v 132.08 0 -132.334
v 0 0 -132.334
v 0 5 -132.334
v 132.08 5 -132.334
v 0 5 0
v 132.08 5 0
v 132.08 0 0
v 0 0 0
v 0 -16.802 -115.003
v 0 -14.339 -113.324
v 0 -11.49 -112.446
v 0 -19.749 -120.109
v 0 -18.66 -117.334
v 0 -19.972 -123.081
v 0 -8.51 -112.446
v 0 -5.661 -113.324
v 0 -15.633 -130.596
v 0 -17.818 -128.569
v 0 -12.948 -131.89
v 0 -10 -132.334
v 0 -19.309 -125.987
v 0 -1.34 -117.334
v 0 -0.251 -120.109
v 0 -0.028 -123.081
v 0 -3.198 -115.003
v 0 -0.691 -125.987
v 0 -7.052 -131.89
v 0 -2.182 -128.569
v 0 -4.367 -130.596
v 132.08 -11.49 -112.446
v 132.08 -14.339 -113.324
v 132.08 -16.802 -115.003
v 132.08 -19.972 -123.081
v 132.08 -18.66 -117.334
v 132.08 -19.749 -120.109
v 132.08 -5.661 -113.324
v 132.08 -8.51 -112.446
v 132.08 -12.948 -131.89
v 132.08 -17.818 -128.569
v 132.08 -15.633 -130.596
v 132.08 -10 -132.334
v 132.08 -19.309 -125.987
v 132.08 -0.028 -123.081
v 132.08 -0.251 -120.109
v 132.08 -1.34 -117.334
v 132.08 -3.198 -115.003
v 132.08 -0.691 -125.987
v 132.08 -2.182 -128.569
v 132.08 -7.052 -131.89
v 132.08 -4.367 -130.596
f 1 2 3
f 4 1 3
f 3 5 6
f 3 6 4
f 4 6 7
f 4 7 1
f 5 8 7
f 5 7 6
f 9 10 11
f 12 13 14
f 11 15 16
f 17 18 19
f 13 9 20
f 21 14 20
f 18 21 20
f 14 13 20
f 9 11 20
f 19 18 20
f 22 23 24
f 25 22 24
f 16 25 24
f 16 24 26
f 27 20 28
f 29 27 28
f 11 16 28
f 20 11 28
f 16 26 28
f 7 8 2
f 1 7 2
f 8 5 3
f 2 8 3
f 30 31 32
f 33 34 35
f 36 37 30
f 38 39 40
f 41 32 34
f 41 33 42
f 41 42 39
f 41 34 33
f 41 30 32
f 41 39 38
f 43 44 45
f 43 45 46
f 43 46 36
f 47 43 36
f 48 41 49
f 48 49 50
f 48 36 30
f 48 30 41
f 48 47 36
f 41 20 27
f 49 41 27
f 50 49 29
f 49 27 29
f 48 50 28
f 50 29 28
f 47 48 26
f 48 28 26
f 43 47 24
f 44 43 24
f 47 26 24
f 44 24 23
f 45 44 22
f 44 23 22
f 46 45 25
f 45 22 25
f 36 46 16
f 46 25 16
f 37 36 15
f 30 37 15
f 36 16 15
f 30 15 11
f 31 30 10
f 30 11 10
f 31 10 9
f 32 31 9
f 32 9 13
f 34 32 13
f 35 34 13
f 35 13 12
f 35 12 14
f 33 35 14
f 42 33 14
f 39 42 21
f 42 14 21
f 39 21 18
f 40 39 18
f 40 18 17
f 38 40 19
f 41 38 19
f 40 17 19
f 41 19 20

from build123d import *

# Parameters (mm, degrees)
SKIZZE1_R                         = 10
AUFSATZ_LINEAR_AUSTRAGEN1_DEPTH   = 132.08
SKIZZE1_W                         = 132.334
SKIZZE1_H                         = 5
AUFSATZ_LINEAR_AUSTRAGEN1_2_DEPTH = 132.08


with BuildPart() as part:
    # Skizze1 → Aufsatz-Linear austragen1 (new body)
    with BuildSketch(Plane(origin=(0, 0, 0), x_dir=(0, 0, -1), z_dir=(1, 0, 0))):
        with Locations((122.334, -10)):
            Circle(SKIZZE1_R)
    extrude(amount=AUFSATZ_LINEAR_AUSTRAGEN1_DEPTH)


with BuildPart() as body_2:
    # Skizze1 → Aufsatz-Linear austragen1 2 (new body)
    with BuildSketch(Plane(origin=(0, 0, 0), x_dir=(0, 0, -1), z_dir=(1, 0, 0))):
        with Locations((66.167, 2.5)):
            Rectangle(SKIZZE1_W, SKIZZE1_H)
    extrude(amount=AUFSATZ_LINEAR_AUSTRAGEN1_2_DEPTH)


solid = Compound([part.part, body_2.part])
